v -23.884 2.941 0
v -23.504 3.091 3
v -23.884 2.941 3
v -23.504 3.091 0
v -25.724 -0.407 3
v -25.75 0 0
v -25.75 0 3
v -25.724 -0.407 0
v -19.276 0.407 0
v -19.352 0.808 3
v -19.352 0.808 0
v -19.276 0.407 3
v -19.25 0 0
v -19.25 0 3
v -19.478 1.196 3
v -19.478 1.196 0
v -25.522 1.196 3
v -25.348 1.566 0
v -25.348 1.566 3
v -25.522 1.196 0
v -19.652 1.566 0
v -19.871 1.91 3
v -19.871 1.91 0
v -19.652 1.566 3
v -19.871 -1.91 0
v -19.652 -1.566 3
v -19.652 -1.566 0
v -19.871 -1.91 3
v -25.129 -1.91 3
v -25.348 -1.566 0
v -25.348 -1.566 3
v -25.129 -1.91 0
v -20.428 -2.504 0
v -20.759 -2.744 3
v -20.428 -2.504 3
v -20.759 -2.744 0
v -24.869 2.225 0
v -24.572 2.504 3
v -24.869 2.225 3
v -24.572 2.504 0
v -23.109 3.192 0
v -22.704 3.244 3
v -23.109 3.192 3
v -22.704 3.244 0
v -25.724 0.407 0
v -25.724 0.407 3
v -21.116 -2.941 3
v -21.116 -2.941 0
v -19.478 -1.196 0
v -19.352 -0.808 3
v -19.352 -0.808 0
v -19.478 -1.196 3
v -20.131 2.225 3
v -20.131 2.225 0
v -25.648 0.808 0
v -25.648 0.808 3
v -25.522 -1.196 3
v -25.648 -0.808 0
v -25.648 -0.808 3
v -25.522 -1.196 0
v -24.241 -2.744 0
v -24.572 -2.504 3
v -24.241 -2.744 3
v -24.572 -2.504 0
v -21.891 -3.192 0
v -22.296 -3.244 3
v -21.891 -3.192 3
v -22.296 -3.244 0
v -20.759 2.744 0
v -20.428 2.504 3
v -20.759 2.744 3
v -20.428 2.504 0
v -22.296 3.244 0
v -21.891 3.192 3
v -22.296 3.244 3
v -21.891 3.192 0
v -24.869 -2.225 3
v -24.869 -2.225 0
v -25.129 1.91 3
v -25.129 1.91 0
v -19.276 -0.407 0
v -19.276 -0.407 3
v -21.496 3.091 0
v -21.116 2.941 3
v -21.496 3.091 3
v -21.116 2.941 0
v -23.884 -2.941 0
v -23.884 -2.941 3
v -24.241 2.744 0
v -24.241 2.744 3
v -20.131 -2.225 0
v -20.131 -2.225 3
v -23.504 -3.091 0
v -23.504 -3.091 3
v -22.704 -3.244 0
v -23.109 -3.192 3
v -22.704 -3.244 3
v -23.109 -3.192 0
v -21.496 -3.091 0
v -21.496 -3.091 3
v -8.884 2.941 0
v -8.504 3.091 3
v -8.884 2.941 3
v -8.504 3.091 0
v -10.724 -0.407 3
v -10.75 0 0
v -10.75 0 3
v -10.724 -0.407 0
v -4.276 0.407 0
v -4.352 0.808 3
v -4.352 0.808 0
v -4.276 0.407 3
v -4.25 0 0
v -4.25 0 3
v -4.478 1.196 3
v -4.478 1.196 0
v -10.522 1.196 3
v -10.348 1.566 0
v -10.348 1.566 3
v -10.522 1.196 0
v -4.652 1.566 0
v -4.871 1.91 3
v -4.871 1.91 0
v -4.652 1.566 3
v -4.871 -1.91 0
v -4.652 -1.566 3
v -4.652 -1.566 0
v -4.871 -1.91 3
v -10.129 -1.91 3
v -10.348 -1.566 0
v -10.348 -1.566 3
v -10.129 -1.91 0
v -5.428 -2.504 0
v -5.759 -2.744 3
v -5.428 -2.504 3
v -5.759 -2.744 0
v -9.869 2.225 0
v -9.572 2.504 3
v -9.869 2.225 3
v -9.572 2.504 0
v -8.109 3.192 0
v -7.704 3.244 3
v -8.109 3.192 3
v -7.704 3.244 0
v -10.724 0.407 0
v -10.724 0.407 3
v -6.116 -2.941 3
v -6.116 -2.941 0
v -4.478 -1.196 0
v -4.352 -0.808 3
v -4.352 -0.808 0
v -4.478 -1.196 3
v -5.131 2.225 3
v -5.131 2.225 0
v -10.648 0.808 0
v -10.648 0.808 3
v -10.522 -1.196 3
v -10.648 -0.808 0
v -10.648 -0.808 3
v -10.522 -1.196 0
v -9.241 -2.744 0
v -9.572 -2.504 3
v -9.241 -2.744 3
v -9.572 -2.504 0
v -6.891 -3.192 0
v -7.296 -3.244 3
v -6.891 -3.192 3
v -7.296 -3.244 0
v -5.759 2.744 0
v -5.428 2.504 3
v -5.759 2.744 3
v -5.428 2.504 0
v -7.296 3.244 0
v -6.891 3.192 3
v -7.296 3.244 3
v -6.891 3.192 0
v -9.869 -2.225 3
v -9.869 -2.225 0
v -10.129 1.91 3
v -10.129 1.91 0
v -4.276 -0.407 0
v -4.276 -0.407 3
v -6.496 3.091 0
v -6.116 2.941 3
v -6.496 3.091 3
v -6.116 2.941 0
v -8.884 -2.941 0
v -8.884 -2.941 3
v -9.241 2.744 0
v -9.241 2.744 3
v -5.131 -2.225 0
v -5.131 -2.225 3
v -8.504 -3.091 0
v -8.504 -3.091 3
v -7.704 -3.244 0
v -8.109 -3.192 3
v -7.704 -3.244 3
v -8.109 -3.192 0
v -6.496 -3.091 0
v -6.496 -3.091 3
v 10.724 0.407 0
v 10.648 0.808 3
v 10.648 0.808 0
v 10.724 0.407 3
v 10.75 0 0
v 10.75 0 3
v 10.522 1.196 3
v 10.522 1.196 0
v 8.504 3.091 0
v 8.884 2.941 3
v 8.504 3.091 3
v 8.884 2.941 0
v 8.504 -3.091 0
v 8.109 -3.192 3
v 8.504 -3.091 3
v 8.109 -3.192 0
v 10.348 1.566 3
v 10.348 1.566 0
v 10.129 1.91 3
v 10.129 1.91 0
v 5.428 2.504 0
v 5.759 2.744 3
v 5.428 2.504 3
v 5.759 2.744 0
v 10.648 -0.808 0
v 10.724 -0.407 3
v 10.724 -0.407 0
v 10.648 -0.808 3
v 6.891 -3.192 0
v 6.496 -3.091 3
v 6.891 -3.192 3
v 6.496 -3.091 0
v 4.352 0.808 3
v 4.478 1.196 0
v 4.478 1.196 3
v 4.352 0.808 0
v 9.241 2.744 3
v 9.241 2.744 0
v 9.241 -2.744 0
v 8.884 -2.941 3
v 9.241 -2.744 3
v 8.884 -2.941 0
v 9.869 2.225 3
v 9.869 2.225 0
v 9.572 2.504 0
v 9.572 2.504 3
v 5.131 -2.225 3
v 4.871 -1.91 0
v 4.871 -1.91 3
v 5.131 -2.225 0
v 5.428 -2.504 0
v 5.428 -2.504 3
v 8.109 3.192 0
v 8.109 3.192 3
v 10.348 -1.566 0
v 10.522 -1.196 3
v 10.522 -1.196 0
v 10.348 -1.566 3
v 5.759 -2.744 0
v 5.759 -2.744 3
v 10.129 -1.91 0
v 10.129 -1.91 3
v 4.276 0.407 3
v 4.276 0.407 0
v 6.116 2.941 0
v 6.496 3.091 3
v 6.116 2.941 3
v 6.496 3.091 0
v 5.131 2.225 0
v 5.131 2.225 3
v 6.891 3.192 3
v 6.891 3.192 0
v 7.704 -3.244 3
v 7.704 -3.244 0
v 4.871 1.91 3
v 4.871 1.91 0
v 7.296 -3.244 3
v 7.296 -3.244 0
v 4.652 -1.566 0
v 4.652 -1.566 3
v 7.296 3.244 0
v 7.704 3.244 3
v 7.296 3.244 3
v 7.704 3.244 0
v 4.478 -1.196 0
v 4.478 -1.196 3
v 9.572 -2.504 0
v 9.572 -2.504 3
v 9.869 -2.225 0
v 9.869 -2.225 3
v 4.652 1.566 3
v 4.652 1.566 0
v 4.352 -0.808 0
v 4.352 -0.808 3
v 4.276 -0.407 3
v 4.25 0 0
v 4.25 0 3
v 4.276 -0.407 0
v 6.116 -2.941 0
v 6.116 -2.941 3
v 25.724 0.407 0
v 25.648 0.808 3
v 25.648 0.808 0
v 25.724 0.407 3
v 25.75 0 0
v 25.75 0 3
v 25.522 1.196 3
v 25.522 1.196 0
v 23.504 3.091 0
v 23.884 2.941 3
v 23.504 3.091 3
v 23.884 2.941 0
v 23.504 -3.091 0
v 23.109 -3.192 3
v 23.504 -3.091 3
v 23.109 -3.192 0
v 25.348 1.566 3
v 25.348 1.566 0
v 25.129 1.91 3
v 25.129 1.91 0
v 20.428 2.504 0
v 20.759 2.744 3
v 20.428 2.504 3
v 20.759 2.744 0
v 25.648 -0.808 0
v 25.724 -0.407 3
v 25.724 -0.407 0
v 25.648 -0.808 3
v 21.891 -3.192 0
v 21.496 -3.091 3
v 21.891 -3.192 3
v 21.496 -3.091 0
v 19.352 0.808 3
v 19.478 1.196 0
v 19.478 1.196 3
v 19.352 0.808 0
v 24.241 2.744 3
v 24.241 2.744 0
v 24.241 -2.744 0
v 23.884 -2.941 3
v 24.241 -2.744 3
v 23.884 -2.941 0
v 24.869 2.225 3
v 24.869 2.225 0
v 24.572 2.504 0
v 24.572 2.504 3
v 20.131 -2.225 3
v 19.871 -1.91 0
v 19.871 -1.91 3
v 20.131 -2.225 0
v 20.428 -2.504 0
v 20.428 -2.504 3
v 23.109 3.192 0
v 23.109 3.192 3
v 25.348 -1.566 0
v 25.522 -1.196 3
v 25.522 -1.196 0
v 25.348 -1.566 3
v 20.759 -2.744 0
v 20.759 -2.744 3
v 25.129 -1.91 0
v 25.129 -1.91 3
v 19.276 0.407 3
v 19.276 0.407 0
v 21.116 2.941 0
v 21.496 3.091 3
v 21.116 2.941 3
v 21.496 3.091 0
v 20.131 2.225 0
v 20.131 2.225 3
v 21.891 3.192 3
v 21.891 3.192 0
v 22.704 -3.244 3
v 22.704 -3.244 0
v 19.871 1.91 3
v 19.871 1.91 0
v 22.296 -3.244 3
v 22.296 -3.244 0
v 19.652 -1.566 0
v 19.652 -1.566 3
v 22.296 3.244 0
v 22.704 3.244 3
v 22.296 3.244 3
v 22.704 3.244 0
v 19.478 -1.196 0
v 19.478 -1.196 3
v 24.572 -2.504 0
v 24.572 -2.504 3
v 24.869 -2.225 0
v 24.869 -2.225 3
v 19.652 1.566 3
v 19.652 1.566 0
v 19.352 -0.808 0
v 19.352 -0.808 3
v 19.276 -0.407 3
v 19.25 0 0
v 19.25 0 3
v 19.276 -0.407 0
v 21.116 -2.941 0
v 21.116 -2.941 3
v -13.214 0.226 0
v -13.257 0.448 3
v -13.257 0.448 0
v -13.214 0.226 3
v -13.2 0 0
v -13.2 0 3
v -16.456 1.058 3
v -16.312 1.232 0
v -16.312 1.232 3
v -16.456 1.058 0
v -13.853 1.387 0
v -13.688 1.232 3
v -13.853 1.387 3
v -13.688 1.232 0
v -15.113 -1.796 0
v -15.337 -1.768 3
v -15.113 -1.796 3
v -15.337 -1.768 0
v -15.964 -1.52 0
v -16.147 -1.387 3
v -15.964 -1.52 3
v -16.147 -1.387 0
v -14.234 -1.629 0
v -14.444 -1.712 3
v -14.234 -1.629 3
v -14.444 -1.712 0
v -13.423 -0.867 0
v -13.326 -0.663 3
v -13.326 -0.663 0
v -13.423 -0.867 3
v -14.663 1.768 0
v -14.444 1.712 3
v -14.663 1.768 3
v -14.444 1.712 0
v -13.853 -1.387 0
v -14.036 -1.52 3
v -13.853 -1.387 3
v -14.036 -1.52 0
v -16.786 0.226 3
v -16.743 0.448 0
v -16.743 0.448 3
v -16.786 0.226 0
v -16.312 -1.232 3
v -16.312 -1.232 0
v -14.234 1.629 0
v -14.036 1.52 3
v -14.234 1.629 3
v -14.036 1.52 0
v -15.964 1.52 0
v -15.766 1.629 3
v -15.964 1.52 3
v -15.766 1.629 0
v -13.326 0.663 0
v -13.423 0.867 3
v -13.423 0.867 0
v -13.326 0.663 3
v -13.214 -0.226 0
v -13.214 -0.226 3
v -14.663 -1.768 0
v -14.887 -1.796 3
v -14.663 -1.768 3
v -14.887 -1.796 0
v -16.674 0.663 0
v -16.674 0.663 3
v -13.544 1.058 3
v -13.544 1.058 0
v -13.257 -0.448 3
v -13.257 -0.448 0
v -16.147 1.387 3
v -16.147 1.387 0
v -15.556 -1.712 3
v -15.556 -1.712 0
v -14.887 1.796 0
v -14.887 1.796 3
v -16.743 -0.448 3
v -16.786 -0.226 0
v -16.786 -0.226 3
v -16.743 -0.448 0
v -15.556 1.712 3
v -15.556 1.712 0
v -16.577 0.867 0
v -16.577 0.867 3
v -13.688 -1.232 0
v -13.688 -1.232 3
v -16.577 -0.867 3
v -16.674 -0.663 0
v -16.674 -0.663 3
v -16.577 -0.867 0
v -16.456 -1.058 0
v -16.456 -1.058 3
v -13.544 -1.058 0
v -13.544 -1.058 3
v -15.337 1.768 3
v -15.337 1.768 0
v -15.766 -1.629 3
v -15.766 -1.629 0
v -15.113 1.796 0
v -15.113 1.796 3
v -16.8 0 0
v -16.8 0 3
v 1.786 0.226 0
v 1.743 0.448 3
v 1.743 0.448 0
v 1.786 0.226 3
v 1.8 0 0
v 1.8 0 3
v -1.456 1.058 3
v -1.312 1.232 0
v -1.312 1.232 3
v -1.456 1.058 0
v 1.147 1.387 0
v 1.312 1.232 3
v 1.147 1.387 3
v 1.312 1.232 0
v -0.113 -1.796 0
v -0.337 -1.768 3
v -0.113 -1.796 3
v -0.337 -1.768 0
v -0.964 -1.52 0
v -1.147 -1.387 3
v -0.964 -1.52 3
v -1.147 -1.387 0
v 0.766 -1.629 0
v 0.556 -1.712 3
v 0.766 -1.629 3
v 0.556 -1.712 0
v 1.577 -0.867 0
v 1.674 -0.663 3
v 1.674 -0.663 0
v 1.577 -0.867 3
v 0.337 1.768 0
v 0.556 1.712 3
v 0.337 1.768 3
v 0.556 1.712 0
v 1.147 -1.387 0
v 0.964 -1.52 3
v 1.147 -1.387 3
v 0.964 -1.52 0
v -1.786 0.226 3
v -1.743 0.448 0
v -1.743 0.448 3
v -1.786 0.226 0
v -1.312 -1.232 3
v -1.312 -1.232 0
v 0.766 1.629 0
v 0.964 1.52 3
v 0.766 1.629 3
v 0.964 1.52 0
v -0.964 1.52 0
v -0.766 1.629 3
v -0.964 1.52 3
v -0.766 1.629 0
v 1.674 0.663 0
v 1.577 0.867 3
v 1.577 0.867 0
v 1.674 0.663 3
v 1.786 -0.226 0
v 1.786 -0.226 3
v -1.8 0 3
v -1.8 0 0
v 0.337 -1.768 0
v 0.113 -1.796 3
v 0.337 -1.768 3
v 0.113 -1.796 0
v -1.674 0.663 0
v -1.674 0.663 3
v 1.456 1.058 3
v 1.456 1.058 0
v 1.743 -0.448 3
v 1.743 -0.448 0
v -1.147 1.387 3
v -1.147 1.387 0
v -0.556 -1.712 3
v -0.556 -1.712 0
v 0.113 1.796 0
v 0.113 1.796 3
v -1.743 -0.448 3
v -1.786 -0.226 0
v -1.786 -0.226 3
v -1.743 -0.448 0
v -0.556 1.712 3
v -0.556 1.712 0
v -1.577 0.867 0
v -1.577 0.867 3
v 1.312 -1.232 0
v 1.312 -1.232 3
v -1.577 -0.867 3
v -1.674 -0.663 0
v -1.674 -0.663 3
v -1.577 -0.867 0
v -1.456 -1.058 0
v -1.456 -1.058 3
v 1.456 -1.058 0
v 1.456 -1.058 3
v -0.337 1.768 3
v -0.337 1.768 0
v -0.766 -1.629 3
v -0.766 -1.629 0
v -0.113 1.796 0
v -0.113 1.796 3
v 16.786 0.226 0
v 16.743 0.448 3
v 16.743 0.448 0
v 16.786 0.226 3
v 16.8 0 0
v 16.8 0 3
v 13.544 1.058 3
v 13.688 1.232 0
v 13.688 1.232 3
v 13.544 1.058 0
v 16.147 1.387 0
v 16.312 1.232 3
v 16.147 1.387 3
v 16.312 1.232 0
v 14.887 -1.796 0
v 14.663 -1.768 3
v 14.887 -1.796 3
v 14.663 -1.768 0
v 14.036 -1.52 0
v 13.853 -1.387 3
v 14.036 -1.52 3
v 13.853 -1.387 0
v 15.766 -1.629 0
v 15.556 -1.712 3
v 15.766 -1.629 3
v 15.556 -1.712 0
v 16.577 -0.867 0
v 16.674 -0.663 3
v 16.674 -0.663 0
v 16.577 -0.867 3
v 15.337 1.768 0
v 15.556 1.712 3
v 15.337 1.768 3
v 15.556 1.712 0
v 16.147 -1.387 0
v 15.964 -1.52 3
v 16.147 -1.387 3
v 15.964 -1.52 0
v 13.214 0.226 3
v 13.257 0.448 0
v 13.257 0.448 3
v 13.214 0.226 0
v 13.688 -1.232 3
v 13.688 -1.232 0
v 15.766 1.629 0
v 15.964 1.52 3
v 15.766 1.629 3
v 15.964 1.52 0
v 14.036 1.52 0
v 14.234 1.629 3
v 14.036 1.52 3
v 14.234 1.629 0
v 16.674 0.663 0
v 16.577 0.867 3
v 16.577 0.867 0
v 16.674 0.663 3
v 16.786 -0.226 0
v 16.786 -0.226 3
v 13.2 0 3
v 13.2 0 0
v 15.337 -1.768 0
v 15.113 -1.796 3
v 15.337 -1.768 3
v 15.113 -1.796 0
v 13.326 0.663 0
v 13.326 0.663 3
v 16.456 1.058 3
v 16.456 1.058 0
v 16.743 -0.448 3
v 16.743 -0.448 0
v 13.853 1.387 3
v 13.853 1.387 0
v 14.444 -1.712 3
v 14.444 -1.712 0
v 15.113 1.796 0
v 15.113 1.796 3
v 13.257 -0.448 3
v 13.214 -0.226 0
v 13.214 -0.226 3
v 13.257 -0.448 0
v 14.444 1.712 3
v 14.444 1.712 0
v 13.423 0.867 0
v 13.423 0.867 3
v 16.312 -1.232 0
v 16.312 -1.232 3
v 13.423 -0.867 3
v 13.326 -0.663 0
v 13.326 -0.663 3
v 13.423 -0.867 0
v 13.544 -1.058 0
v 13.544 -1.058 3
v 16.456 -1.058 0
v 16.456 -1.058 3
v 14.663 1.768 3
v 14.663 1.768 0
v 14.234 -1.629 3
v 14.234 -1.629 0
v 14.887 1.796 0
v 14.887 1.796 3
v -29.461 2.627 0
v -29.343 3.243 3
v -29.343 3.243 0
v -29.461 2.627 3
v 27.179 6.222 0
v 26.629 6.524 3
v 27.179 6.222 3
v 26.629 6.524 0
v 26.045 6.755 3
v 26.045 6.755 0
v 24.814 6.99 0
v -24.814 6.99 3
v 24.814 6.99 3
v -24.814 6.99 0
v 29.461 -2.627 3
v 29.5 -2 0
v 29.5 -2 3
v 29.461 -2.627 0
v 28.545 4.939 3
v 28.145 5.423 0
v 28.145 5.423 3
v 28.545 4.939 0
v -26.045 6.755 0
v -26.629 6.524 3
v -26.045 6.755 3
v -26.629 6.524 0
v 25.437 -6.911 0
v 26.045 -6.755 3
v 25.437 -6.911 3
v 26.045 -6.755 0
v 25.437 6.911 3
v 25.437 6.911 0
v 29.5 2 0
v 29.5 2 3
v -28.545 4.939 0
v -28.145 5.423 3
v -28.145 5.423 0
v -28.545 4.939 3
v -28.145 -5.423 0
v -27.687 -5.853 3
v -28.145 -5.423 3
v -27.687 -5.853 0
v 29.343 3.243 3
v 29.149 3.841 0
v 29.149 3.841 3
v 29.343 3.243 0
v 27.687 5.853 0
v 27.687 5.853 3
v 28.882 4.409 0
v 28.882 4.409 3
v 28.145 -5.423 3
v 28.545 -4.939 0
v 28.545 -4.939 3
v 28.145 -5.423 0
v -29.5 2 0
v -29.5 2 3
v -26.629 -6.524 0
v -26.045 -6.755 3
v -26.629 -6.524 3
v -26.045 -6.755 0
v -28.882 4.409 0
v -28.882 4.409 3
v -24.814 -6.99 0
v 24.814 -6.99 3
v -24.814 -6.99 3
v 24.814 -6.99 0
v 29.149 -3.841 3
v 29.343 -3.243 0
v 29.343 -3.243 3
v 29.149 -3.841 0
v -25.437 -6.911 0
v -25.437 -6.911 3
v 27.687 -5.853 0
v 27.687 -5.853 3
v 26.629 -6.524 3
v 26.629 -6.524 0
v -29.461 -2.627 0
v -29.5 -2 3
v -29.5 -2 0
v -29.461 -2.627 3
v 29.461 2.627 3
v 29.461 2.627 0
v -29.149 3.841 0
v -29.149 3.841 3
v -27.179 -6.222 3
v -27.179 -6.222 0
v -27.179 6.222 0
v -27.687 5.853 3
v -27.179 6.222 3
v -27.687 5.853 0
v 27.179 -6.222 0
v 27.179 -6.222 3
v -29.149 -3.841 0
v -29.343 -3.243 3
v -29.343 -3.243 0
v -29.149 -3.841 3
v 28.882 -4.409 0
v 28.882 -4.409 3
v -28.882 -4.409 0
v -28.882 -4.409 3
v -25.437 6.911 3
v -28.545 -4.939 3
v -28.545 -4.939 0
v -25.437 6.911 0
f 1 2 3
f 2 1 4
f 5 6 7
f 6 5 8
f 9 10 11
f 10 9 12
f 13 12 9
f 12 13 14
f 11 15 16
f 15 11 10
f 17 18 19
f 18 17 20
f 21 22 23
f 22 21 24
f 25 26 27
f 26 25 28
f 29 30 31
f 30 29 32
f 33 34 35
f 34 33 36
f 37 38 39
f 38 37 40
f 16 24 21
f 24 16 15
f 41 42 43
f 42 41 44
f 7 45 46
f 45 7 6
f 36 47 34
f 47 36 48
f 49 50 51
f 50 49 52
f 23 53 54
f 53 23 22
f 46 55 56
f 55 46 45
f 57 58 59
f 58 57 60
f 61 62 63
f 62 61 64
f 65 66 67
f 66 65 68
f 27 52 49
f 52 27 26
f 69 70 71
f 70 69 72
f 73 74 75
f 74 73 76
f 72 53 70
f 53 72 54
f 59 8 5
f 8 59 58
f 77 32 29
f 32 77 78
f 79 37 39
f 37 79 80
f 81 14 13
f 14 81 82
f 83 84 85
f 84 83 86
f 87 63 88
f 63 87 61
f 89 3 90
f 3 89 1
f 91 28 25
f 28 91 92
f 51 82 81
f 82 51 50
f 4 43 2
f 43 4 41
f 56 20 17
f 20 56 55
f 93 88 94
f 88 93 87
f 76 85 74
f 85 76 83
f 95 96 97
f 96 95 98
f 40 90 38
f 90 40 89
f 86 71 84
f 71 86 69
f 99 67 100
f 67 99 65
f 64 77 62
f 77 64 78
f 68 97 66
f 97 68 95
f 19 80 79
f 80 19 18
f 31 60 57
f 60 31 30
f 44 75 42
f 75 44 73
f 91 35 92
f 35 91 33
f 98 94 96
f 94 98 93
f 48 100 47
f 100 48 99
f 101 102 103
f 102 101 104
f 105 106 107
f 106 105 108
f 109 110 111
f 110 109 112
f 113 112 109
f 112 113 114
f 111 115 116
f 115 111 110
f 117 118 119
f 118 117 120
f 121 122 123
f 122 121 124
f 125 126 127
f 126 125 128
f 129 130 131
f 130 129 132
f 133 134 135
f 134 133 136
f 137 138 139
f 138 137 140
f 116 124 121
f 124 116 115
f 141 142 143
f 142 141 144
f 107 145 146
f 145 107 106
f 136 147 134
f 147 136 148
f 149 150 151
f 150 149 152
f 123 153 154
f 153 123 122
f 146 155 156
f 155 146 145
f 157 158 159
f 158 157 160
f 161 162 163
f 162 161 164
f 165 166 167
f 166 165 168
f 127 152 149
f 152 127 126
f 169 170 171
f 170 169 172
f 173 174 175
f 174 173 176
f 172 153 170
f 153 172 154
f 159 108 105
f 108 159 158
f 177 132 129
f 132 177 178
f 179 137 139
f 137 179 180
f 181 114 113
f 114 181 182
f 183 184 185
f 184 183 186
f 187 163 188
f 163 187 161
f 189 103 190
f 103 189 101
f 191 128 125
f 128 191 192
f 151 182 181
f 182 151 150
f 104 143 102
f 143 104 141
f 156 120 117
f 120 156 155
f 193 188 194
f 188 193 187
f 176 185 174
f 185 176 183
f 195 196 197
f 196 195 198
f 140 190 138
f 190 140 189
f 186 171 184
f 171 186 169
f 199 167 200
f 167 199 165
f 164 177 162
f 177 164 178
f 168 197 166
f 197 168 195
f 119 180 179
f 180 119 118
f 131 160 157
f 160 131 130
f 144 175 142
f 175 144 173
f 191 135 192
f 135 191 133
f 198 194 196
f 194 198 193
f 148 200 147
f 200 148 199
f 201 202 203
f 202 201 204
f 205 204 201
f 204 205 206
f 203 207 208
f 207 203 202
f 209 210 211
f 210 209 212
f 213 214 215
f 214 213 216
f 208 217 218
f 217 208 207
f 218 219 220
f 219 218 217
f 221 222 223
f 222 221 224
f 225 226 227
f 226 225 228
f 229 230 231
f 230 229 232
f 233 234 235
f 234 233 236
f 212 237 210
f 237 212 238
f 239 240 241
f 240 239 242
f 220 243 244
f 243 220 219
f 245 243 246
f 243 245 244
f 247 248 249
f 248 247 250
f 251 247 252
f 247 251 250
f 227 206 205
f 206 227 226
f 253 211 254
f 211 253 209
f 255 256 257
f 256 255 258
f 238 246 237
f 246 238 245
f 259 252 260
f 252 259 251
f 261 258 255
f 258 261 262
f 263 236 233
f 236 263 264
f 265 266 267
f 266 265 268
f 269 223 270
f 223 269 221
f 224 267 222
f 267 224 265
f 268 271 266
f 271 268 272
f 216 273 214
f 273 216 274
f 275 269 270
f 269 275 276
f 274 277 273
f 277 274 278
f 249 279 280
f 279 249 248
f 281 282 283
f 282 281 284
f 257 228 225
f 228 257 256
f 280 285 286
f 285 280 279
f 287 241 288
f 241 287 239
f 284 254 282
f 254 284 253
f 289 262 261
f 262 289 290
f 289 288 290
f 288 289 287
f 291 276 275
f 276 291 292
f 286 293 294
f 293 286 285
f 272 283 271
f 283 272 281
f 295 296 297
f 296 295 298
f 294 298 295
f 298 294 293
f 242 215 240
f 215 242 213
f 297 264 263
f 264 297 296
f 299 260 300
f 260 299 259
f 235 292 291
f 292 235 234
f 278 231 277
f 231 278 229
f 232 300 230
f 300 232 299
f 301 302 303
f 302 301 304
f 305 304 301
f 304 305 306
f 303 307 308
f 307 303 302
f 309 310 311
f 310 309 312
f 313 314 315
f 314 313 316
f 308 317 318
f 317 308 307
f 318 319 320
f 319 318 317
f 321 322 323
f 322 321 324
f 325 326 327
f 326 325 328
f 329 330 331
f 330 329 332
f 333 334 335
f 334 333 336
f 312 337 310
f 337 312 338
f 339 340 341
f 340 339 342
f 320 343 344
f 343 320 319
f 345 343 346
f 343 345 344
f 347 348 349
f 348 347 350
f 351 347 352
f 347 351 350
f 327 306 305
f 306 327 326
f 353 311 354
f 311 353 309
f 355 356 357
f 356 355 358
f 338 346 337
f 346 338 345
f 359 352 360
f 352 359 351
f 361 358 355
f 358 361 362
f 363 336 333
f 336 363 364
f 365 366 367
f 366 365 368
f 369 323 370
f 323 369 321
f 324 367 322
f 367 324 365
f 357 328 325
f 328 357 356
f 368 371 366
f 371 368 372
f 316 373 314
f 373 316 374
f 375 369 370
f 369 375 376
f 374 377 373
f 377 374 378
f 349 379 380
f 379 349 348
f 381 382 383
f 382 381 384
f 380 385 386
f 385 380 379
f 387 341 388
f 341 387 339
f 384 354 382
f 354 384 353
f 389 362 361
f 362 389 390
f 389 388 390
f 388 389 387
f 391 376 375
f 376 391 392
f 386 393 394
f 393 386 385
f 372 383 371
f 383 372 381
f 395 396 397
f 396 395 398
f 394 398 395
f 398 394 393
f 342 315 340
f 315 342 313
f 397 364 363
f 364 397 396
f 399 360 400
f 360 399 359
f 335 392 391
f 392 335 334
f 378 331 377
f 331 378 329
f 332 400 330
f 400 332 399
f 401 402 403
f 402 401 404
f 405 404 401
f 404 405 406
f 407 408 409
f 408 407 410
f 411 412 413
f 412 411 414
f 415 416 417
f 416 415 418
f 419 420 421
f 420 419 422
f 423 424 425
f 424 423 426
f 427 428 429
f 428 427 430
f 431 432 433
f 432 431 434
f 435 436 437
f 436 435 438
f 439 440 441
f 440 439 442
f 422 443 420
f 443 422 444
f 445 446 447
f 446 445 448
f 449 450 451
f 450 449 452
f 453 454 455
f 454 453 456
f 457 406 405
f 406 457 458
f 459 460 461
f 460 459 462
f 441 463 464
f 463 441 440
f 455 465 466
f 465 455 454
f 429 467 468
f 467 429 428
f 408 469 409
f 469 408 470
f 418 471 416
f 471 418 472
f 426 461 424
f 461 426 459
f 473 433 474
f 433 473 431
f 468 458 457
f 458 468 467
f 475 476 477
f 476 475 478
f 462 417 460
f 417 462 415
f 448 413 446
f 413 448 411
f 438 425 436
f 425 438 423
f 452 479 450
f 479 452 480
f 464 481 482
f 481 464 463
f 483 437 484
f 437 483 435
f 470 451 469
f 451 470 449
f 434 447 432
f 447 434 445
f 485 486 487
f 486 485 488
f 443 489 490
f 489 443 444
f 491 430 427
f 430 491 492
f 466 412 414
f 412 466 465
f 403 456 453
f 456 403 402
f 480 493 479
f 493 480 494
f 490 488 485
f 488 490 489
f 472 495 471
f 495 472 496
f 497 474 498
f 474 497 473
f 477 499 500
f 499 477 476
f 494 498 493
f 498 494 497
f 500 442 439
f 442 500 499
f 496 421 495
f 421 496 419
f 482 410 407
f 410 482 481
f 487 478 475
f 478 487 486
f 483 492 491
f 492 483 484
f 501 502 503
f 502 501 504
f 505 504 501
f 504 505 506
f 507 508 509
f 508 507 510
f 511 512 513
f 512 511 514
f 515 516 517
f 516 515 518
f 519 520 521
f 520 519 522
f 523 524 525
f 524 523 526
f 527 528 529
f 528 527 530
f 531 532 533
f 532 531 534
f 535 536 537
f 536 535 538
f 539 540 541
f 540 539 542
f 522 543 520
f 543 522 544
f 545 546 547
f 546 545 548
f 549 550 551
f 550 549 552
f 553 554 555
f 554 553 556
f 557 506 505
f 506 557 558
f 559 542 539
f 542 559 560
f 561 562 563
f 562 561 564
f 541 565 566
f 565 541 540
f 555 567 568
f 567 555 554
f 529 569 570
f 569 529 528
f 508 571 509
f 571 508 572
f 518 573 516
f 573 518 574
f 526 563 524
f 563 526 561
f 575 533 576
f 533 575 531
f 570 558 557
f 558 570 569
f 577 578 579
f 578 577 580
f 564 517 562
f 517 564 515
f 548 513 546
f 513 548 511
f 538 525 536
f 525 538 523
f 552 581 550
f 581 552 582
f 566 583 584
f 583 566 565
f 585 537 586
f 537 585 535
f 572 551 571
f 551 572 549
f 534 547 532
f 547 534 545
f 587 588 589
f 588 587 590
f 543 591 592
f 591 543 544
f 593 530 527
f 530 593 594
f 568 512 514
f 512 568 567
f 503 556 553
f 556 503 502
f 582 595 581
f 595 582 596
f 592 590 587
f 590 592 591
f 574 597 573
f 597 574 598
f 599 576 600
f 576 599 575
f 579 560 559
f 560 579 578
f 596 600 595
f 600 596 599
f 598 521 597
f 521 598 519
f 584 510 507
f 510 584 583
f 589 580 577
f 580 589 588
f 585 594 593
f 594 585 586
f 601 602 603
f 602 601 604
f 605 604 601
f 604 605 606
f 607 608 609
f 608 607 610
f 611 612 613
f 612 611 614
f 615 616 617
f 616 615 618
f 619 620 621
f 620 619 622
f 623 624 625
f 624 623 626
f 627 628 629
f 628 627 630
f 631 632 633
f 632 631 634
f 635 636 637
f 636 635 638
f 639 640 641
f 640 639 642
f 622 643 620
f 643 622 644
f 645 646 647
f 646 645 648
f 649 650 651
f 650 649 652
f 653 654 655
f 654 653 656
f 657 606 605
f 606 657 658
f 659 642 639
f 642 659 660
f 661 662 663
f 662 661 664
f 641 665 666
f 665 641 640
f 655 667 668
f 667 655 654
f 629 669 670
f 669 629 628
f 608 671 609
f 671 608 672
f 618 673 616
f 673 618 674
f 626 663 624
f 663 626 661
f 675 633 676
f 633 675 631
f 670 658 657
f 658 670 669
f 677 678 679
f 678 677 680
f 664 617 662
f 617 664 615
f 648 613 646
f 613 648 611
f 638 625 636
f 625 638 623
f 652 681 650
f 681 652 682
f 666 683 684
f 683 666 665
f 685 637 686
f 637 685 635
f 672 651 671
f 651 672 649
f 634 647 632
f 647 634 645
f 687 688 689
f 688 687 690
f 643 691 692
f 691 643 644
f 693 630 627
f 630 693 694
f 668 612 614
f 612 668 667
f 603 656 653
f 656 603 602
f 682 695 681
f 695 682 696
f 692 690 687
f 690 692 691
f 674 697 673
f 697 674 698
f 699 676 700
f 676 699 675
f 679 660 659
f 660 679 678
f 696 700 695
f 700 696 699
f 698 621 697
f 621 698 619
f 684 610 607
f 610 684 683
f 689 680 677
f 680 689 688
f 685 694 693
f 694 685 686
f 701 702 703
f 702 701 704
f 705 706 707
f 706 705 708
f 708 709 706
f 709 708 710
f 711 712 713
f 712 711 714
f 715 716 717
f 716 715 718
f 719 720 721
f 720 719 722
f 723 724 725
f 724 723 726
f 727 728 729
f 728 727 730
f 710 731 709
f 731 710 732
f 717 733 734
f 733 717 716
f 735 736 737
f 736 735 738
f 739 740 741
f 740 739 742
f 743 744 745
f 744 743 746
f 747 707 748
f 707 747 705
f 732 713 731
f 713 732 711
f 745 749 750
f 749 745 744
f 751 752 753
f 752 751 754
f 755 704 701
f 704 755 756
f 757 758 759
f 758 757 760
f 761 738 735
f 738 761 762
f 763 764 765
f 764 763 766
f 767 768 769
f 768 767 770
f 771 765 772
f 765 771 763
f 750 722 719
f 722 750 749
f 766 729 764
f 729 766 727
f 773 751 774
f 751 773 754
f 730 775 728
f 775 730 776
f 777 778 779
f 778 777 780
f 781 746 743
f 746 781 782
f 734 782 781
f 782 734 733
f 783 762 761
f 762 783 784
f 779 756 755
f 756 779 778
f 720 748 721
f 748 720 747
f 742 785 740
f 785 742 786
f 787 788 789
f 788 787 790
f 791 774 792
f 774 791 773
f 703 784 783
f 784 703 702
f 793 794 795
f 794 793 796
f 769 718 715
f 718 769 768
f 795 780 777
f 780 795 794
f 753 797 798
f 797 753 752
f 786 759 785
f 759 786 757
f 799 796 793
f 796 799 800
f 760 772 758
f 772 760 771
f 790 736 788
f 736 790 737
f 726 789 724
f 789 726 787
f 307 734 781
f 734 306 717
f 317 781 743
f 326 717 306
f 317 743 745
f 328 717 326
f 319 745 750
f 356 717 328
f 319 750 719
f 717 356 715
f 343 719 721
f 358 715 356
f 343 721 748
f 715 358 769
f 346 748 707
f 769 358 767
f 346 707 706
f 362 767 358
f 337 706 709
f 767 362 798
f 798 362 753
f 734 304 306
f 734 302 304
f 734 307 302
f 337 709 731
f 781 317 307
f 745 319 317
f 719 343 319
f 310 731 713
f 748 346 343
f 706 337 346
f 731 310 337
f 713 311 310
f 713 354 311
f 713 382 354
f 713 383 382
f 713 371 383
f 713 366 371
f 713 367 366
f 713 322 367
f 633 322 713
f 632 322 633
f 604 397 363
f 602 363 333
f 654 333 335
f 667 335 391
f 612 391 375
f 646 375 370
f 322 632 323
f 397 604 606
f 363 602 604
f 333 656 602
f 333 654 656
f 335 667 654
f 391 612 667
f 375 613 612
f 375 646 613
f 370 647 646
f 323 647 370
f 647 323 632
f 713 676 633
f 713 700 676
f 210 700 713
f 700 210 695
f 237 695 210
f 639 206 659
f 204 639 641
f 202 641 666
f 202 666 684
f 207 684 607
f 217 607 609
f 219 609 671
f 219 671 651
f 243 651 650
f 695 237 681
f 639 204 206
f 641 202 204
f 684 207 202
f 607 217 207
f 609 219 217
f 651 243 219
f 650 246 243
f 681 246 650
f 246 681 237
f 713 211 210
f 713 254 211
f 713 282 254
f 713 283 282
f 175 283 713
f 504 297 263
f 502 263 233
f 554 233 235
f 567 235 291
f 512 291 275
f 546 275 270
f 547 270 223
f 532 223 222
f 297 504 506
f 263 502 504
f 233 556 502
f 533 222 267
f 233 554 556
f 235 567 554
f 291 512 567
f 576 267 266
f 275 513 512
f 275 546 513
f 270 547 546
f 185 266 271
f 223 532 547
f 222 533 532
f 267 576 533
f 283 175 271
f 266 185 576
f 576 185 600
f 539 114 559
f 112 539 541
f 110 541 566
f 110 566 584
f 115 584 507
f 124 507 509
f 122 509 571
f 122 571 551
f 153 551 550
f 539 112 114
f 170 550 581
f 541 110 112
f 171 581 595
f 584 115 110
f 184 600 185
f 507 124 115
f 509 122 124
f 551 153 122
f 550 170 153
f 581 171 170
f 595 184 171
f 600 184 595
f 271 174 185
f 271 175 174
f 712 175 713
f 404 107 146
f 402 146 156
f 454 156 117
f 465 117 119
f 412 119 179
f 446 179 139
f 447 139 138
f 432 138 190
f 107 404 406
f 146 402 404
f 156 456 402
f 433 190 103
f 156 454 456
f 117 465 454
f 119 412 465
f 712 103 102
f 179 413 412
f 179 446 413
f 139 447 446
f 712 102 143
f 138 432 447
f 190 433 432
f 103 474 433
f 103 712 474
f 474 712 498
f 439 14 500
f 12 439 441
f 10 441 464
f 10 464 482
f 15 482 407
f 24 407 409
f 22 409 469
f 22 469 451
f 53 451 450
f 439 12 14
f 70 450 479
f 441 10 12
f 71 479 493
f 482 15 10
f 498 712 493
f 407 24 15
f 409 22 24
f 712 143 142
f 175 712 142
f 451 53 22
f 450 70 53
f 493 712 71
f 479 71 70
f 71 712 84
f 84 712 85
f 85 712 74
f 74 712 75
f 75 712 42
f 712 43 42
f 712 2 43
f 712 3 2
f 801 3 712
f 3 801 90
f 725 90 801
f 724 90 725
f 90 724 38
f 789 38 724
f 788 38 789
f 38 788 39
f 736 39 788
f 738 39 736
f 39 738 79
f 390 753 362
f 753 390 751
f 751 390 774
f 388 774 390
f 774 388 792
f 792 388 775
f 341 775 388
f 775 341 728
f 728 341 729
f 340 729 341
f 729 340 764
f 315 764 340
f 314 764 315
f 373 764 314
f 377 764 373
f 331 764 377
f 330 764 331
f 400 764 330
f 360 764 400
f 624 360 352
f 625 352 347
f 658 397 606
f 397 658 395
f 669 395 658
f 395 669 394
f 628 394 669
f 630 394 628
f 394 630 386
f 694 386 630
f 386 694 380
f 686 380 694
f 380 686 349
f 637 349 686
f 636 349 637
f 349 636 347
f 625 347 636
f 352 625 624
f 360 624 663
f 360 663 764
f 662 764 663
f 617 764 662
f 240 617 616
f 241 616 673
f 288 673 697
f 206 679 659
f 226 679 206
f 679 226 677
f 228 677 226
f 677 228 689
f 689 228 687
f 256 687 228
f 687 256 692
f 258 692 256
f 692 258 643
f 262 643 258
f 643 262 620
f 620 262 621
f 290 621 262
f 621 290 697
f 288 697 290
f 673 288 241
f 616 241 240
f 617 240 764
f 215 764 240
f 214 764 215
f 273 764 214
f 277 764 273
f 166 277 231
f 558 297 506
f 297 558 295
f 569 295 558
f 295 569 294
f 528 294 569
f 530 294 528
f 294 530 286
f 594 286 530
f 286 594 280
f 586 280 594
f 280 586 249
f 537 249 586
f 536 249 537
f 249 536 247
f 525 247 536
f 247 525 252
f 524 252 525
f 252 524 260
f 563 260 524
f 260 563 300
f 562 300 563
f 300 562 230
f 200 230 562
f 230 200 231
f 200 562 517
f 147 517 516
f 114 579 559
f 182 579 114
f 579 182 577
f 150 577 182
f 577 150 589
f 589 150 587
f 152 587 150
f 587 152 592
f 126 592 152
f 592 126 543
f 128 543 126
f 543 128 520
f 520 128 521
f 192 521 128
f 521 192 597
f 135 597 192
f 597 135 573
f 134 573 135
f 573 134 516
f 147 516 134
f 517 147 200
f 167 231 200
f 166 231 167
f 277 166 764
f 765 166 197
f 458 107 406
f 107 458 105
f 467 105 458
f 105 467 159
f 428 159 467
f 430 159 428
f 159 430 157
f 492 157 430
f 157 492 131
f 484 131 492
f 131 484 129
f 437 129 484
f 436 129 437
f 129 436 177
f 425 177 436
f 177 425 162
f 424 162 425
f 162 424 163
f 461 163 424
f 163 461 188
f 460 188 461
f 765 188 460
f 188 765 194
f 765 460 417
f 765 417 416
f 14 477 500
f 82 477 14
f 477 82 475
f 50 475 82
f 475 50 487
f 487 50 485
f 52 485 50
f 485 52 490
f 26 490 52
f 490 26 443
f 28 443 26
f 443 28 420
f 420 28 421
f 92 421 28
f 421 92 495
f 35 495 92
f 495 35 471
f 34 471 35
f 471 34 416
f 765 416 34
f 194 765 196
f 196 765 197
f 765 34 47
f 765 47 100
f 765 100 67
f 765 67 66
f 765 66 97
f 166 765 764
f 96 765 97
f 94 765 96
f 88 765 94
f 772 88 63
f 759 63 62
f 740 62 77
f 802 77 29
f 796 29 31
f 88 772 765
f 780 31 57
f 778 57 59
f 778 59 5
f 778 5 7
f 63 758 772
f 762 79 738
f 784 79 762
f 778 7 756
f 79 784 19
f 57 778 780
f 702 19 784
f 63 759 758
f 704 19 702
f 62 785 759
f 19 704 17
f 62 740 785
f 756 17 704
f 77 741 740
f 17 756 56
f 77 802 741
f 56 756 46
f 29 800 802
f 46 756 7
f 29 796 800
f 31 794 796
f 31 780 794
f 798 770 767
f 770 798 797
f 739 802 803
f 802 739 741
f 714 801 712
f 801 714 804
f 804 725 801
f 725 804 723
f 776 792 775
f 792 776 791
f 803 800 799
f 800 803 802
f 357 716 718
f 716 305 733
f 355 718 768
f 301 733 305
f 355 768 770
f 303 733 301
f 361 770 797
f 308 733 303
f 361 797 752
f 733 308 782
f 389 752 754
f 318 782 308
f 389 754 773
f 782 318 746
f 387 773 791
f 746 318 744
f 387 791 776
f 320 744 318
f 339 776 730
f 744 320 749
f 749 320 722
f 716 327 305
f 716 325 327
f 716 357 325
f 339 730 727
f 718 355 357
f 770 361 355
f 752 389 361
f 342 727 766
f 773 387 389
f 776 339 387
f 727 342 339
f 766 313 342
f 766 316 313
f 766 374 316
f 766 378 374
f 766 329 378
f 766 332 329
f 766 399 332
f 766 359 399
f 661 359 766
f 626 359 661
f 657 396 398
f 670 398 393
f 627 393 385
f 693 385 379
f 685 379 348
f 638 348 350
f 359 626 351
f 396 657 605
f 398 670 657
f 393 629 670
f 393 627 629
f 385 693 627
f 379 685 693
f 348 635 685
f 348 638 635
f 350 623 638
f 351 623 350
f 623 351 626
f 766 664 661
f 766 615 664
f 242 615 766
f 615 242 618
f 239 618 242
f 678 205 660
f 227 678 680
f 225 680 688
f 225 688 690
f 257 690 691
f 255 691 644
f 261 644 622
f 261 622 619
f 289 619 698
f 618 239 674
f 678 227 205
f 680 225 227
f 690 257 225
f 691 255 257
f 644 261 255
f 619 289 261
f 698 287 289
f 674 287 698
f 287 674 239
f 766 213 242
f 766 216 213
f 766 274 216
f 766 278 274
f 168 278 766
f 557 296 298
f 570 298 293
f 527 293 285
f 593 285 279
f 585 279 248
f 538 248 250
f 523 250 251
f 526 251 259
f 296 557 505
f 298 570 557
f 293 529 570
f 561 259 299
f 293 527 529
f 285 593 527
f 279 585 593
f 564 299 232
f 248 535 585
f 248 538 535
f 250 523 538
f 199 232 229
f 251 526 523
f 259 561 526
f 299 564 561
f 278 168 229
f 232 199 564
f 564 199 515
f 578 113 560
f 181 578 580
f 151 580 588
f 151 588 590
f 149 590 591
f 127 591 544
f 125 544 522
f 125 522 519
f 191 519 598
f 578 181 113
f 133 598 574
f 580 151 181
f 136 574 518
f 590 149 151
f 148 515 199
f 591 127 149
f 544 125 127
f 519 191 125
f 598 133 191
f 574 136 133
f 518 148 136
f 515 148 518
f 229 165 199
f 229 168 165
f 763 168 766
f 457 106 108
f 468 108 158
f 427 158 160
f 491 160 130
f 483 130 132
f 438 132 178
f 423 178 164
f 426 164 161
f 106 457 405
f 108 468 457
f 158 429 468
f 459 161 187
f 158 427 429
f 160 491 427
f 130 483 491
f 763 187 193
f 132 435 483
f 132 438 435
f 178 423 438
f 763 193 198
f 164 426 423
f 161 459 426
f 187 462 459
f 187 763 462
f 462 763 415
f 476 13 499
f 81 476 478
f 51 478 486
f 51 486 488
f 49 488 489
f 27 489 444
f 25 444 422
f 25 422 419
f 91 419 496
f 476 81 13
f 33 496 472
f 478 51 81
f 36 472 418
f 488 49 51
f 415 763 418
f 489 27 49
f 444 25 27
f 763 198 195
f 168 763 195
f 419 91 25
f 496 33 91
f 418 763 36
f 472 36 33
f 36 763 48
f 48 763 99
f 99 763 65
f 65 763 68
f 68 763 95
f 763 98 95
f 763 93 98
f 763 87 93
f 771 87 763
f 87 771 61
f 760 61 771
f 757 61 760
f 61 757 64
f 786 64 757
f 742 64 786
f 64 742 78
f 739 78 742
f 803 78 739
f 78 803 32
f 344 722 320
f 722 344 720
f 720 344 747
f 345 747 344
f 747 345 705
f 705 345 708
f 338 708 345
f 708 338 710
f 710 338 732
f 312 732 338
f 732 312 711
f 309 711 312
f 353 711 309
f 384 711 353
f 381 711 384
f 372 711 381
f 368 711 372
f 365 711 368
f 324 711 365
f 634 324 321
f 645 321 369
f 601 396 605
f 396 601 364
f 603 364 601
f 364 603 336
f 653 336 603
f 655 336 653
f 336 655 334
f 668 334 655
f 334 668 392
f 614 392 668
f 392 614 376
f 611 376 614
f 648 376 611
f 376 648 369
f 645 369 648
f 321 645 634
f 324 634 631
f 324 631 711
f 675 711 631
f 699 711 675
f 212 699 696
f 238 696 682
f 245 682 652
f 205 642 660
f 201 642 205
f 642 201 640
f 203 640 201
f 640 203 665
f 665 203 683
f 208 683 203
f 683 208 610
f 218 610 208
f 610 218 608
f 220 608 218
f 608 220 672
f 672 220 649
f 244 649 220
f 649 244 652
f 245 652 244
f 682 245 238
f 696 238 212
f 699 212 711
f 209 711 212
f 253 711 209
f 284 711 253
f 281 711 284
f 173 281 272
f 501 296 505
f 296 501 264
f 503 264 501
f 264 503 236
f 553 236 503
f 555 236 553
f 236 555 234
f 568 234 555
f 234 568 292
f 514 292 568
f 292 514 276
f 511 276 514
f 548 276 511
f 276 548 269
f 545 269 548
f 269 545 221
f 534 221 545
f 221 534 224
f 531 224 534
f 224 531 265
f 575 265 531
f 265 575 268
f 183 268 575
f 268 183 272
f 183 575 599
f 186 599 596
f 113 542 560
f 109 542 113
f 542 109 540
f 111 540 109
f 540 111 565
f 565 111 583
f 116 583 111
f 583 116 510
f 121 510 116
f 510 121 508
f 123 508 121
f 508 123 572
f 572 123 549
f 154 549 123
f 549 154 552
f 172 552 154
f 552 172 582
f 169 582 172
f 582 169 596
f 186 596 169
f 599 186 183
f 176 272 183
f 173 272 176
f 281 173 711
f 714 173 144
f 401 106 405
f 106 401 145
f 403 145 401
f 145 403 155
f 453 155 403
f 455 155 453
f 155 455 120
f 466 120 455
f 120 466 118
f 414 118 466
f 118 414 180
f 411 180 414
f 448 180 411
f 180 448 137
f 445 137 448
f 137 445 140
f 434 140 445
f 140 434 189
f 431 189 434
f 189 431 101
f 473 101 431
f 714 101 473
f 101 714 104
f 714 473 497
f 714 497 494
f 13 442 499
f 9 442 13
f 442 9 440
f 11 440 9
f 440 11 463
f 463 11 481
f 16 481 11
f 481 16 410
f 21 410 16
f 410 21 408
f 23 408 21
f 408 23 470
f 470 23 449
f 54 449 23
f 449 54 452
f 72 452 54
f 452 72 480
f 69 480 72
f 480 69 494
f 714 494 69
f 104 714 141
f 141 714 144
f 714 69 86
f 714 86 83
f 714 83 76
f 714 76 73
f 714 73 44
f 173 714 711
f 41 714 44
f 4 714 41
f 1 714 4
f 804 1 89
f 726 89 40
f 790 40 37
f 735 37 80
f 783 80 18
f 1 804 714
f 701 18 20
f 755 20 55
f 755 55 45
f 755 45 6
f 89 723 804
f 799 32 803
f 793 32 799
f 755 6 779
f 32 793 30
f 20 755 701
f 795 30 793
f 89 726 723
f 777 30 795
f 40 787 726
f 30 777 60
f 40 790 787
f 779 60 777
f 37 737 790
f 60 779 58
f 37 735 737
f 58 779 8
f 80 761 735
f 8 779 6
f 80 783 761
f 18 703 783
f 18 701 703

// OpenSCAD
$fn = 50;


difference() {
	union() {
		*color(alpha = 1.0000000000, c = "gray") {
			translate(v = [0, 7, 0]) {
				linear_extrude(height = 1) {
					text(font = "Arial:style=Bold", halign = "center", size = 4.5000000000, text = "COMMENT plate main", valign = "center");
				}
			}
		}
		hull() {
			translate(v = [-24.5000000000, 2.0000000000, 0]) {
				cylinder(h = 3, r = 5);
			}
			translate(v = [24.5000000000, 2.0000000000, 0]) {
				cylinder(h = 3, r = 5);
			}
			translate(v = [-24.5000000000, -2.0000000000, 0]) {
				cylinder(h = 3, r = 5);
			}
			translate(v = [24.5000000000, -2.0000000000, 0]) {
				cylinder(h = 3, r = 5);
			}
		}
	}
	union() {
		*color(alpha = 1.0000000000, c = "gray") {
			translate(v = [0, 7, 0]) {
				linear_extrude(height = 1) {
					text(font = "Arial:style=Bold", halign = "center", size = 4.5000000000, text = "COMMENT holes main", valign = "center");
				}
			}
		}
		translate(v = [-22.5000000000, 0.0000000000, 0]) {
			translate(v = [0, 0, -100]) {
				cylinder(h = 200, r = 3.2500000000);
			}
		}
		translate(v = [-7.5000000000, 0.0000000000, 0]) {
			translate(v = [0, 0, -100]) {
				cylinder(h = 200, r = 3.2500000000);
			}
		}
		translate(v = [7.5000000000, 0.0000000000, 0]) {
			translate(v = [0, 0, -100]) {
				cylinder(h = 200, r = 3.2500000000);
			}
		}
		translate(v = [22.5000000000, 0.0000000000, 0]) {
			translate(v = [0, 0, -100]) {
				cylinder(h = 200, r = 3.2500000000);
			}
		}
		translate(v = [-22.5000000000, 0.0000000000, 0]) {
			translate(v = [0, 0, -100]) {
				cylinder(h = 200, r = 1.8000000000);
			}
		}
		translate(v = [-15.0000000000, 0.0000000000, 0]) {
			translate(v = [0, 0, -100]) {
				cylinder(h = 200, r = 1.8000000000);
			}
		}
		translate(v = [-7.5000000000, 0.0000000000, 0]) {
			translate(v = [0, 0, -100]) {
				cylinder(h = 200, r = 1.8000000000);
			}
		}
		translate(v = [0, 0, -100]) {
			cylinder(h = 200, r = 1.8000000000);
		}
		translate(v = [7.5000000000, 0.0000000000, 0]) {
			translate(v = [0, 0, -100]) {
				cylinder(h = 200, r = 1.8000000000);
			}
		}
		translate(v = [15.0000000000, 0.0000000000, 0]) {
			translate(v = [0, 0, -100]) {
				cylinder(h = 200, r = 1.8000000000);
			}
		}
		translate(v = [22.5000000000, 0.0000000000, 0]) {
			translate(v = [0, 0, -100]) {
				cylinder(h = 200, r = 1.8000000000);
			}
		}
	}
}
